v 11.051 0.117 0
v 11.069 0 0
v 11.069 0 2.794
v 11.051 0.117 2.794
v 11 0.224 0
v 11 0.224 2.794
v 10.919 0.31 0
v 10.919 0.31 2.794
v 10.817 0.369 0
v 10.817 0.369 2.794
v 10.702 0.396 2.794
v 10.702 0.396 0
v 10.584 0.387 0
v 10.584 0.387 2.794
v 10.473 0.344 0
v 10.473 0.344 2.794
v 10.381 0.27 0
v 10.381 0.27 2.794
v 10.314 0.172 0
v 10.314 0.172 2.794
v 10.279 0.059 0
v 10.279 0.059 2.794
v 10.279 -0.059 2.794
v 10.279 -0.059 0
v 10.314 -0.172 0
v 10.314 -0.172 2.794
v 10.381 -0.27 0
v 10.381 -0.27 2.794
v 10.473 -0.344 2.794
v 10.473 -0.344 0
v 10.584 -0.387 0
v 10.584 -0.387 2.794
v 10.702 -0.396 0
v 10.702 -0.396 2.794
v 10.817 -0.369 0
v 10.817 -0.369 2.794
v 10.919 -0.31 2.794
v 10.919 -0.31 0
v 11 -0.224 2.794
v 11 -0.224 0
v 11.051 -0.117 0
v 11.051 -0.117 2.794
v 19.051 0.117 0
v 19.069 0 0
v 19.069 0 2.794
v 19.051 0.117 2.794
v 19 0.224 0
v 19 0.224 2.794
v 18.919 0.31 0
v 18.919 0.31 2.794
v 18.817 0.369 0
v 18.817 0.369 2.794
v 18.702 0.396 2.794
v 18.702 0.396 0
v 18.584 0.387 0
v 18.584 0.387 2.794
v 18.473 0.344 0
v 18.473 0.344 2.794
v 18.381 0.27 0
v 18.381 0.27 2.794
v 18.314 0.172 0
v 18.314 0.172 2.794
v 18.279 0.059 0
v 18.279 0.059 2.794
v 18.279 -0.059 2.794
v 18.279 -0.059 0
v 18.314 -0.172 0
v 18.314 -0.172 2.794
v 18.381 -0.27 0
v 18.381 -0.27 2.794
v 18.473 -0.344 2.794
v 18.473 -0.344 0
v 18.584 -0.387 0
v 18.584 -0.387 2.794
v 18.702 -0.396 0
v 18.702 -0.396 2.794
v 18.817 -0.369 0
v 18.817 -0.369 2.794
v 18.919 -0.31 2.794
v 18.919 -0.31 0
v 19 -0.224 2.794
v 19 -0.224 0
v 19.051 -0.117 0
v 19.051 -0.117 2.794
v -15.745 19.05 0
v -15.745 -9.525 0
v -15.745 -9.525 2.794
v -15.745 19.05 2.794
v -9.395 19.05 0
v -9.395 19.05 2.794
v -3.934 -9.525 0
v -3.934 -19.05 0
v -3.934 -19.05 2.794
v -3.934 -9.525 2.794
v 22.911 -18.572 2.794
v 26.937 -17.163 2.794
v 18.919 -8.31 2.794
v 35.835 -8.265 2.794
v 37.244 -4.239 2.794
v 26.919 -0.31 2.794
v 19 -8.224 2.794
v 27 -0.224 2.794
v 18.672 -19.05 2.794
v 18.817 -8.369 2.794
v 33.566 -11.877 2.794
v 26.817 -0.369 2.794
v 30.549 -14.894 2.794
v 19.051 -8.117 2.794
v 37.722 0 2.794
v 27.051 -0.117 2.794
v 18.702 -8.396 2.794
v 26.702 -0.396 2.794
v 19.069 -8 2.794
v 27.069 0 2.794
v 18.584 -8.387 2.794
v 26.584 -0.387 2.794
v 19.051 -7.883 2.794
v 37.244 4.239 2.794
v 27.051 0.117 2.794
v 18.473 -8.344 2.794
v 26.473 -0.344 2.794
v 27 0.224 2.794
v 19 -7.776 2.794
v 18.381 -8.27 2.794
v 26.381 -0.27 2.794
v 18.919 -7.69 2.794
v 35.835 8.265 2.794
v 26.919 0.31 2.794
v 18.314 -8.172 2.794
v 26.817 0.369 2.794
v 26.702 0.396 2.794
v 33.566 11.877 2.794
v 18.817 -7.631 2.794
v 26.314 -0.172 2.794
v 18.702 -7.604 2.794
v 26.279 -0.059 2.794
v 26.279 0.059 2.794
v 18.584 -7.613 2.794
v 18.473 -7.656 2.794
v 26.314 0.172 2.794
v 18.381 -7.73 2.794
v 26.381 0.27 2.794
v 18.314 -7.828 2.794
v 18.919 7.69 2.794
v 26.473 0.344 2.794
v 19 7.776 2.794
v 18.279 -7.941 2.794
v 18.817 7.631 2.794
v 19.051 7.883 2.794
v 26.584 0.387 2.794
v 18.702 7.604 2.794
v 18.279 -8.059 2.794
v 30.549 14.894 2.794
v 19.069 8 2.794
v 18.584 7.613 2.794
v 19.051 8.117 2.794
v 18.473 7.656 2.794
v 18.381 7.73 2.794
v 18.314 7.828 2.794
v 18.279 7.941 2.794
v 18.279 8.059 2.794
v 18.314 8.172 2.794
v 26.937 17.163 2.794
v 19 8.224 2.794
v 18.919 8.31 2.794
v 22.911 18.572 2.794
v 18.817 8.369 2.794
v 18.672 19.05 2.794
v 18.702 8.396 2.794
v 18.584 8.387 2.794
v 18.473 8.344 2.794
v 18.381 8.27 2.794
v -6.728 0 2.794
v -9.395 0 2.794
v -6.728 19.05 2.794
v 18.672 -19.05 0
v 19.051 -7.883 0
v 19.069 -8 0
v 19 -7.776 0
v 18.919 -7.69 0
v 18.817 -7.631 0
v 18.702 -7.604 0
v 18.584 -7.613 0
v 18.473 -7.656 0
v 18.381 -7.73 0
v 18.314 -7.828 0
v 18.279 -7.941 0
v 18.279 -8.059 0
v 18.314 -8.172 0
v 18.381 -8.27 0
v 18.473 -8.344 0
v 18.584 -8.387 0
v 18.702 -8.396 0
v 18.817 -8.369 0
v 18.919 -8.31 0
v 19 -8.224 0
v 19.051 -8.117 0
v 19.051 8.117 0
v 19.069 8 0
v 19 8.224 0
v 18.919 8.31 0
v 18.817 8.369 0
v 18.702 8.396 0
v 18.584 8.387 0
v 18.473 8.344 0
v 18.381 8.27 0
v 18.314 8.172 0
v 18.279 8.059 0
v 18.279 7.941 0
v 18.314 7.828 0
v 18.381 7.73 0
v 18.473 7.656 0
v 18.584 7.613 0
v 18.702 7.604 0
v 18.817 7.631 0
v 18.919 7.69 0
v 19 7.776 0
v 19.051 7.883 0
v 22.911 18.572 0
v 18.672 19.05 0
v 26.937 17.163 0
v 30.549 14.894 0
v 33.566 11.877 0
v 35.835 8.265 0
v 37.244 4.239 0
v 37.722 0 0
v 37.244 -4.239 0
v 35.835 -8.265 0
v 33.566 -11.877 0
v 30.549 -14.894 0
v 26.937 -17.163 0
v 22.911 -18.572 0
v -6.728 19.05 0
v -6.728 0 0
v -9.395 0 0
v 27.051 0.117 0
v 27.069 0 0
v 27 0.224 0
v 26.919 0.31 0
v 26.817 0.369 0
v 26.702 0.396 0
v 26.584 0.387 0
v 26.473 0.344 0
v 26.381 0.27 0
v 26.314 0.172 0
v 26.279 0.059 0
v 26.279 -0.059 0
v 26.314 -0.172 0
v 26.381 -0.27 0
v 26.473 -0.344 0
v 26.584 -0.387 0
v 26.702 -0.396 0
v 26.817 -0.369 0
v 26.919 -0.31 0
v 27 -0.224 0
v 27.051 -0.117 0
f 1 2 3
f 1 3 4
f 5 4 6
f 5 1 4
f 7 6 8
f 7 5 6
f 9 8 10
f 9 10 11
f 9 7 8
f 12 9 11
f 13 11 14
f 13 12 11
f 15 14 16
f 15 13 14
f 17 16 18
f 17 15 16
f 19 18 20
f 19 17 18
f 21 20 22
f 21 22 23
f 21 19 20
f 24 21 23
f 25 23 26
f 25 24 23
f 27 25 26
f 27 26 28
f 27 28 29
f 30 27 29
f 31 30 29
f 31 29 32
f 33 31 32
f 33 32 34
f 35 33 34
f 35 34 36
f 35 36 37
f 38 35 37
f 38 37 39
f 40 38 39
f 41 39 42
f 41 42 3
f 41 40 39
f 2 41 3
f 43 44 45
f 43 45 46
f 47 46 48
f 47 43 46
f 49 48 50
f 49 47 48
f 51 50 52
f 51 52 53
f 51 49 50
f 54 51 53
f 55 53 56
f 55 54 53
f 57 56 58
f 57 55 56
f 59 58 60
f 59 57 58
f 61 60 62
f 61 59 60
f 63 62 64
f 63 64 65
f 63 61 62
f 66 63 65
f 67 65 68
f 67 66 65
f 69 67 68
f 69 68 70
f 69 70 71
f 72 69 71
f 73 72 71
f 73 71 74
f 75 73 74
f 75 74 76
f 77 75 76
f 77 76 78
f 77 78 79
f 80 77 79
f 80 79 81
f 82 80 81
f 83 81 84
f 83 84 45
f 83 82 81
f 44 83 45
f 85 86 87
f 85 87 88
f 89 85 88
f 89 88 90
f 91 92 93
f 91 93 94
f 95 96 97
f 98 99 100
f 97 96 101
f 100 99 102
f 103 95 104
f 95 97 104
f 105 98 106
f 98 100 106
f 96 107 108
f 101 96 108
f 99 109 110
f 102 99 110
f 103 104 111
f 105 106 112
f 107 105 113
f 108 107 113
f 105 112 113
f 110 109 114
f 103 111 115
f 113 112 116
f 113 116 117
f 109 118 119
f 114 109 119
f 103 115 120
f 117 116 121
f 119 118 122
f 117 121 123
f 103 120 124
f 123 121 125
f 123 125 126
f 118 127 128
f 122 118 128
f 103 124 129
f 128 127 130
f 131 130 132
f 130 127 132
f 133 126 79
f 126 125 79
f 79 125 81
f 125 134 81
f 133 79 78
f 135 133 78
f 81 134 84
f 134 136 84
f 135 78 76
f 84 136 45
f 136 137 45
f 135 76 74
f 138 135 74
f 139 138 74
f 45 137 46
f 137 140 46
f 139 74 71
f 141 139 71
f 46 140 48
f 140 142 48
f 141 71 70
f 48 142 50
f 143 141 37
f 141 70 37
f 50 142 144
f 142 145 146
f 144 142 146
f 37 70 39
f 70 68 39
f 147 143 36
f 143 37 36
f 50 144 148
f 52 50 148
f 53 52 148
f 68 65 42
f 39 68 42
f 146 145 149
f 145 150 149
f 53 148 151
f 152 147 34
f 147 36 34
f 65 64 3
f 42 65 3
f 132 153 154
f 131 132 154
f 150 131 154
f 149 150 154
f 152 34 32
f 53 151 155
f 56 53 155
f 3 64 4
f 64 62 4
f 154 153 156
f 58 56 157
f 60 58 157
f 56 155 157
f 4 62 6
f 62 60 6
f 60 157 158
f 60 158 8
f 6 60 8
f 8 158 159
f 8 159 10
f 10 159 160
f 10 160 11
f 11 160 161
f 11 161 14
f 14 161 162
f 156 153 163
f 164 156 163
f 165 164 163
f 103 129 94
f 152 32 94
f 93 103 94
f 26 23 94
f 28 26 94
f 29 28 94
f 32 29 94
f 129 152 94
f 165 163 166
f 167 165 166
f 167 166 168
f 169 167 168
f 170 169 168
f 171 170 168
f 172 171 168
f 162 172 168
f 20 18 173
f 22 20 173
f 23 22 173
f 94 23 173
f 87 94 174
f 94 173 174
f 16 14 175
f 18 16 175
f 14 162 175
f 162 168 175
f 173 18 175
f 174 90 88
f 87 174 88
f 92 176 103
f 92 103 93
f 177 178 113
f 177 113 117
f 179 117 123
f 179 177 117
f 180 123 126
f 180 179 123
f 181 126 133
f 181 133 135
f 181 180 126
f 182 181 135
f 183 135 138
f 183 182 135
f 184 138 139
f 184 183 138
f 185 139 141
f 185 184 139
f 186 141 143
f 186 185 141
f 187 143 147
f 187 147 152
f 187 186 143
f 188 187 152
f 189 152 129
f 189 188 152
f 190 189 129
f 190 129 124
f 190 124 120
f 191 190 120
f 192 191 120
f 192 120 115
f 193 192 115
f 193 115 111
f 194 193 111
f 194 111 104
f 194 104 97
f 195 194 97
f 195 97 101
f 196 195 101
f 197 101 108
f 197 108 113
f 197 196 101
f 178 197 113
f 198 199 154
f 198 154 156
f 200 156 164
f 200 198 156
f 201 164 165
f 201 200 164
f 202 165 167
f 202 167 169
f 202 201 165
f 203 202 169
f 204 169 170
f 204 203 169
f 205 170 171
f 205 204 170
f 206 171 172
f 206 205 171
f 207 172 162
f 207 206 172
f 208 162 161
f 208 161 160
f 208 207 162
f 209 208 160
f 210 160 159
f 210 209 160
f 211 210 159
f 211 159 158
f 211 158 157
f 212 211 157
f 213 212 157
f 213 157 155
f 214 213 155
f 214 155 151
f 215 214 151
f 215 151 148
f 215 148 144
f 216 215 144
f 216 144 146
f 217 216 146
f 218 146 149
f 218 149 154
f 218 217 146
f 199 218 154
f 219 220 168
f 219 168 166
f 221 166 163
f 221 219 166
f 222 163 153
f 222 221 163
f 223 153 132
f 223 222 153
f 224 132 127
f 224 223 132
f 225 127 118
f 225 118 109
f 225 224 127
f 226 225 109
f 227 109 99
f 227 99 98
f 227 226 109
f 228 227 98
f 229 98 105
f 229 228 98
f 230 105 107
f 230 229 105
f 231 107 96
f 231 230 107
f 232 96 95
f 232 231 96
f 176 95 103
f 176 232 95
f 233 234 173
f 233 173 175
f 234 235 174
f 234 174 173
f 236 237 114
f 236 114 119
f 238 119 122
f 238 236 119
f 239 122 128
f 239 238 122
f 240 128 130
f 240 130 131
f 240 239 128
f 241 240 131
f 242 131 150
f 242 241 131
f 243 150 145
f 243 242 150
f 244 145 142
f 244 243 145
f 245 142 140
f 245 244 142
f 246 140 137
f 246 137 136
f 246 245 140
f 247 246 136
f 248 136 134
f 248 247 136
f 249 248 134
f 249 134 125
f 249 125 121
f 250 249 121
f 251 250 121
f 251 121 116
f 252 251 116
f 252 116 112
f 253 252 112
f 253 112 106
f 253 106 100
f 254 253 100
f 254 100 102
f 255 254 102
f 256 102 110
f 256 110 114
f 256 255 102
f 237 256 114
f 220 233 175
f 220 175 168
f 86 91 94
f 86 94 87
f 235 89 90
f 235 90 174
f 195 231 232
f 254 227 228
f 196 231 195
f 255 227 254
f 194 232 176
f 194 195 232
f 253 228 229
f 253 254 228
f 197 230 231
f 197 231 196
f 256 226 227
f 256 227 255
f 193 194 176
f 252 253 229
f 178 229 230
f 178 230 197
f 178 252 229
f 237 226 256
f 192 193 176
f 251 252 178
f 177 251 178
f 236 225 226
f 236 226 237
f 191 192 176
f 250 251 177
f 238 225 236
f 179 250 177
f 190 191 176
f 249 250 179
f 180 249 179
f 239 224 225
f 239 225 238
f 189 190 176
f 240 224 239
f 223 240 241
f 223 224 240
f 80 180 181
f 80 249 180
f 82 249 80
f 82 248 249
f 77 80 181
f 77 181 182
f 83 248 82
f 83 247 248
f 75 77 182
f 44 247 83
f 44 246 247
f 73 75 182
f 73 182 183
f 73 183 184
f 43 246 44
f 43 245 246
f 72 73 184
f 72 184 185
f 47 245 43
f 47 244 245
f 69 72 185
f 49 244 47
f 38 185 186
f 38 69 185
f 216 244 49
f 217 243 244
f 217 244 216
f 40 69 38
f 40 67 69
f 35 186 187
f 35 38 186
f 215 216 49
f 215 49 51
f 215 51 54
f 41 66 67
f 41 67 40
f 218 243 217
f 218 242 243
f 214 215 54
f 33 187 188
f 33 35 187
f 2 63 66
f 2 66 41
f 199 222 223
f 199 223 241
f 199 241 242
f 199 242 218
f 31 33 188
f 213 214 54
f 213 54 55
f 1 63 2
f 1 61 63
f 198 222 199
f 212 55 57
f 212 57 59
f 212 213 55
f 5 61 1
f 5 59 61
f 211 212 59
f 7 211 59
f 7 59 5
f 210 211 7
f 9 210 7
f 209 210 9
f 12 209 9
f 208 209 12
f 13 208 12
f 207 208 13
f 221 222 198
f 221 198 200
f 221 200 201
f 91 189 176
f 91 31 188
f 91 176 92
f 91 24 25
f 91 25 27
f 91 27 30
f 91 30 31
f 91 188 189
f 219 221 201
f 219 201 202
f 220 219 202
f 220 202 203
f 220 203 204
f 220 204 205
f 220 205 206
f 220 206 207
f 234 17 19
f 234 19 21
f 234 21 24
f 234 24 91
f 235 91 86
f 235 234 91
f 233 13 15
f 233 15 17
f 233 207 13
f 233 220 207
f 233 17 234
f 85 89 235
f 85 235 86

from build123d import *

# Parameters (mm, degrees)
SKETCH1_R           = 0.396875
BOSS_EXTRUDE1_DEPTH = 2.794


with BuildPart() as part:
    # Sketch1 → Boss-Extrude1 (new body)
    with BuildSketch(Plane.XY):
        with BuildLine():
            Line((-6.728072382, 19.05), (18.671927618, 19.05))
            ThreePointArc((18.671927618, 19.05), (37.721927618, 0), (18.671927618, -19.05))
            Line((18.671927618, -19.05), (-3.934072382, -19.05))
            Line((-3.934072382, -19.05), (-3.934072382, -9.525))
            Line((-3.934072382, -9.525), (-15.745072382, -9.525))
            Line((-15.745072382, -9.525), (-15.745072382, 19.05))
            Line((-15.745072382, 19.05), (-9.395072382, 19.05))
            Line((-9.395072382, 19.05), (-9.395072382, 0))
            Line((-9.395072382, 0), (-6.728072382, 0))
            Line((-6.728072382, 0), (-6.728072382, 19.05))
        make_face()
        with Locations((18.671927618, 8)):
            Circle(SKETCH1_R, mode=Mode.SUBTRACT)
        with Locations((18.671927618, 0)):
            Circle(SKETCH1_R, mode=Mode.SUBTRACT)
        with Locations((26.671927618, 0)):
            Circle(SKETCH1_R, mode=Mode.SUBTRACT)
        with Locations((18.671927618, -8)):
            Circle(SKETCH1_R, mode=Mode.SUBTRACT)
        with Locations((10.671927618, 0)):
            Circle(SKETCH1_R, mode=Mode.SUBTRACT)
    extrude(amount=BOSS_EXTRUDE1_DEPTH)


solid = part.part
